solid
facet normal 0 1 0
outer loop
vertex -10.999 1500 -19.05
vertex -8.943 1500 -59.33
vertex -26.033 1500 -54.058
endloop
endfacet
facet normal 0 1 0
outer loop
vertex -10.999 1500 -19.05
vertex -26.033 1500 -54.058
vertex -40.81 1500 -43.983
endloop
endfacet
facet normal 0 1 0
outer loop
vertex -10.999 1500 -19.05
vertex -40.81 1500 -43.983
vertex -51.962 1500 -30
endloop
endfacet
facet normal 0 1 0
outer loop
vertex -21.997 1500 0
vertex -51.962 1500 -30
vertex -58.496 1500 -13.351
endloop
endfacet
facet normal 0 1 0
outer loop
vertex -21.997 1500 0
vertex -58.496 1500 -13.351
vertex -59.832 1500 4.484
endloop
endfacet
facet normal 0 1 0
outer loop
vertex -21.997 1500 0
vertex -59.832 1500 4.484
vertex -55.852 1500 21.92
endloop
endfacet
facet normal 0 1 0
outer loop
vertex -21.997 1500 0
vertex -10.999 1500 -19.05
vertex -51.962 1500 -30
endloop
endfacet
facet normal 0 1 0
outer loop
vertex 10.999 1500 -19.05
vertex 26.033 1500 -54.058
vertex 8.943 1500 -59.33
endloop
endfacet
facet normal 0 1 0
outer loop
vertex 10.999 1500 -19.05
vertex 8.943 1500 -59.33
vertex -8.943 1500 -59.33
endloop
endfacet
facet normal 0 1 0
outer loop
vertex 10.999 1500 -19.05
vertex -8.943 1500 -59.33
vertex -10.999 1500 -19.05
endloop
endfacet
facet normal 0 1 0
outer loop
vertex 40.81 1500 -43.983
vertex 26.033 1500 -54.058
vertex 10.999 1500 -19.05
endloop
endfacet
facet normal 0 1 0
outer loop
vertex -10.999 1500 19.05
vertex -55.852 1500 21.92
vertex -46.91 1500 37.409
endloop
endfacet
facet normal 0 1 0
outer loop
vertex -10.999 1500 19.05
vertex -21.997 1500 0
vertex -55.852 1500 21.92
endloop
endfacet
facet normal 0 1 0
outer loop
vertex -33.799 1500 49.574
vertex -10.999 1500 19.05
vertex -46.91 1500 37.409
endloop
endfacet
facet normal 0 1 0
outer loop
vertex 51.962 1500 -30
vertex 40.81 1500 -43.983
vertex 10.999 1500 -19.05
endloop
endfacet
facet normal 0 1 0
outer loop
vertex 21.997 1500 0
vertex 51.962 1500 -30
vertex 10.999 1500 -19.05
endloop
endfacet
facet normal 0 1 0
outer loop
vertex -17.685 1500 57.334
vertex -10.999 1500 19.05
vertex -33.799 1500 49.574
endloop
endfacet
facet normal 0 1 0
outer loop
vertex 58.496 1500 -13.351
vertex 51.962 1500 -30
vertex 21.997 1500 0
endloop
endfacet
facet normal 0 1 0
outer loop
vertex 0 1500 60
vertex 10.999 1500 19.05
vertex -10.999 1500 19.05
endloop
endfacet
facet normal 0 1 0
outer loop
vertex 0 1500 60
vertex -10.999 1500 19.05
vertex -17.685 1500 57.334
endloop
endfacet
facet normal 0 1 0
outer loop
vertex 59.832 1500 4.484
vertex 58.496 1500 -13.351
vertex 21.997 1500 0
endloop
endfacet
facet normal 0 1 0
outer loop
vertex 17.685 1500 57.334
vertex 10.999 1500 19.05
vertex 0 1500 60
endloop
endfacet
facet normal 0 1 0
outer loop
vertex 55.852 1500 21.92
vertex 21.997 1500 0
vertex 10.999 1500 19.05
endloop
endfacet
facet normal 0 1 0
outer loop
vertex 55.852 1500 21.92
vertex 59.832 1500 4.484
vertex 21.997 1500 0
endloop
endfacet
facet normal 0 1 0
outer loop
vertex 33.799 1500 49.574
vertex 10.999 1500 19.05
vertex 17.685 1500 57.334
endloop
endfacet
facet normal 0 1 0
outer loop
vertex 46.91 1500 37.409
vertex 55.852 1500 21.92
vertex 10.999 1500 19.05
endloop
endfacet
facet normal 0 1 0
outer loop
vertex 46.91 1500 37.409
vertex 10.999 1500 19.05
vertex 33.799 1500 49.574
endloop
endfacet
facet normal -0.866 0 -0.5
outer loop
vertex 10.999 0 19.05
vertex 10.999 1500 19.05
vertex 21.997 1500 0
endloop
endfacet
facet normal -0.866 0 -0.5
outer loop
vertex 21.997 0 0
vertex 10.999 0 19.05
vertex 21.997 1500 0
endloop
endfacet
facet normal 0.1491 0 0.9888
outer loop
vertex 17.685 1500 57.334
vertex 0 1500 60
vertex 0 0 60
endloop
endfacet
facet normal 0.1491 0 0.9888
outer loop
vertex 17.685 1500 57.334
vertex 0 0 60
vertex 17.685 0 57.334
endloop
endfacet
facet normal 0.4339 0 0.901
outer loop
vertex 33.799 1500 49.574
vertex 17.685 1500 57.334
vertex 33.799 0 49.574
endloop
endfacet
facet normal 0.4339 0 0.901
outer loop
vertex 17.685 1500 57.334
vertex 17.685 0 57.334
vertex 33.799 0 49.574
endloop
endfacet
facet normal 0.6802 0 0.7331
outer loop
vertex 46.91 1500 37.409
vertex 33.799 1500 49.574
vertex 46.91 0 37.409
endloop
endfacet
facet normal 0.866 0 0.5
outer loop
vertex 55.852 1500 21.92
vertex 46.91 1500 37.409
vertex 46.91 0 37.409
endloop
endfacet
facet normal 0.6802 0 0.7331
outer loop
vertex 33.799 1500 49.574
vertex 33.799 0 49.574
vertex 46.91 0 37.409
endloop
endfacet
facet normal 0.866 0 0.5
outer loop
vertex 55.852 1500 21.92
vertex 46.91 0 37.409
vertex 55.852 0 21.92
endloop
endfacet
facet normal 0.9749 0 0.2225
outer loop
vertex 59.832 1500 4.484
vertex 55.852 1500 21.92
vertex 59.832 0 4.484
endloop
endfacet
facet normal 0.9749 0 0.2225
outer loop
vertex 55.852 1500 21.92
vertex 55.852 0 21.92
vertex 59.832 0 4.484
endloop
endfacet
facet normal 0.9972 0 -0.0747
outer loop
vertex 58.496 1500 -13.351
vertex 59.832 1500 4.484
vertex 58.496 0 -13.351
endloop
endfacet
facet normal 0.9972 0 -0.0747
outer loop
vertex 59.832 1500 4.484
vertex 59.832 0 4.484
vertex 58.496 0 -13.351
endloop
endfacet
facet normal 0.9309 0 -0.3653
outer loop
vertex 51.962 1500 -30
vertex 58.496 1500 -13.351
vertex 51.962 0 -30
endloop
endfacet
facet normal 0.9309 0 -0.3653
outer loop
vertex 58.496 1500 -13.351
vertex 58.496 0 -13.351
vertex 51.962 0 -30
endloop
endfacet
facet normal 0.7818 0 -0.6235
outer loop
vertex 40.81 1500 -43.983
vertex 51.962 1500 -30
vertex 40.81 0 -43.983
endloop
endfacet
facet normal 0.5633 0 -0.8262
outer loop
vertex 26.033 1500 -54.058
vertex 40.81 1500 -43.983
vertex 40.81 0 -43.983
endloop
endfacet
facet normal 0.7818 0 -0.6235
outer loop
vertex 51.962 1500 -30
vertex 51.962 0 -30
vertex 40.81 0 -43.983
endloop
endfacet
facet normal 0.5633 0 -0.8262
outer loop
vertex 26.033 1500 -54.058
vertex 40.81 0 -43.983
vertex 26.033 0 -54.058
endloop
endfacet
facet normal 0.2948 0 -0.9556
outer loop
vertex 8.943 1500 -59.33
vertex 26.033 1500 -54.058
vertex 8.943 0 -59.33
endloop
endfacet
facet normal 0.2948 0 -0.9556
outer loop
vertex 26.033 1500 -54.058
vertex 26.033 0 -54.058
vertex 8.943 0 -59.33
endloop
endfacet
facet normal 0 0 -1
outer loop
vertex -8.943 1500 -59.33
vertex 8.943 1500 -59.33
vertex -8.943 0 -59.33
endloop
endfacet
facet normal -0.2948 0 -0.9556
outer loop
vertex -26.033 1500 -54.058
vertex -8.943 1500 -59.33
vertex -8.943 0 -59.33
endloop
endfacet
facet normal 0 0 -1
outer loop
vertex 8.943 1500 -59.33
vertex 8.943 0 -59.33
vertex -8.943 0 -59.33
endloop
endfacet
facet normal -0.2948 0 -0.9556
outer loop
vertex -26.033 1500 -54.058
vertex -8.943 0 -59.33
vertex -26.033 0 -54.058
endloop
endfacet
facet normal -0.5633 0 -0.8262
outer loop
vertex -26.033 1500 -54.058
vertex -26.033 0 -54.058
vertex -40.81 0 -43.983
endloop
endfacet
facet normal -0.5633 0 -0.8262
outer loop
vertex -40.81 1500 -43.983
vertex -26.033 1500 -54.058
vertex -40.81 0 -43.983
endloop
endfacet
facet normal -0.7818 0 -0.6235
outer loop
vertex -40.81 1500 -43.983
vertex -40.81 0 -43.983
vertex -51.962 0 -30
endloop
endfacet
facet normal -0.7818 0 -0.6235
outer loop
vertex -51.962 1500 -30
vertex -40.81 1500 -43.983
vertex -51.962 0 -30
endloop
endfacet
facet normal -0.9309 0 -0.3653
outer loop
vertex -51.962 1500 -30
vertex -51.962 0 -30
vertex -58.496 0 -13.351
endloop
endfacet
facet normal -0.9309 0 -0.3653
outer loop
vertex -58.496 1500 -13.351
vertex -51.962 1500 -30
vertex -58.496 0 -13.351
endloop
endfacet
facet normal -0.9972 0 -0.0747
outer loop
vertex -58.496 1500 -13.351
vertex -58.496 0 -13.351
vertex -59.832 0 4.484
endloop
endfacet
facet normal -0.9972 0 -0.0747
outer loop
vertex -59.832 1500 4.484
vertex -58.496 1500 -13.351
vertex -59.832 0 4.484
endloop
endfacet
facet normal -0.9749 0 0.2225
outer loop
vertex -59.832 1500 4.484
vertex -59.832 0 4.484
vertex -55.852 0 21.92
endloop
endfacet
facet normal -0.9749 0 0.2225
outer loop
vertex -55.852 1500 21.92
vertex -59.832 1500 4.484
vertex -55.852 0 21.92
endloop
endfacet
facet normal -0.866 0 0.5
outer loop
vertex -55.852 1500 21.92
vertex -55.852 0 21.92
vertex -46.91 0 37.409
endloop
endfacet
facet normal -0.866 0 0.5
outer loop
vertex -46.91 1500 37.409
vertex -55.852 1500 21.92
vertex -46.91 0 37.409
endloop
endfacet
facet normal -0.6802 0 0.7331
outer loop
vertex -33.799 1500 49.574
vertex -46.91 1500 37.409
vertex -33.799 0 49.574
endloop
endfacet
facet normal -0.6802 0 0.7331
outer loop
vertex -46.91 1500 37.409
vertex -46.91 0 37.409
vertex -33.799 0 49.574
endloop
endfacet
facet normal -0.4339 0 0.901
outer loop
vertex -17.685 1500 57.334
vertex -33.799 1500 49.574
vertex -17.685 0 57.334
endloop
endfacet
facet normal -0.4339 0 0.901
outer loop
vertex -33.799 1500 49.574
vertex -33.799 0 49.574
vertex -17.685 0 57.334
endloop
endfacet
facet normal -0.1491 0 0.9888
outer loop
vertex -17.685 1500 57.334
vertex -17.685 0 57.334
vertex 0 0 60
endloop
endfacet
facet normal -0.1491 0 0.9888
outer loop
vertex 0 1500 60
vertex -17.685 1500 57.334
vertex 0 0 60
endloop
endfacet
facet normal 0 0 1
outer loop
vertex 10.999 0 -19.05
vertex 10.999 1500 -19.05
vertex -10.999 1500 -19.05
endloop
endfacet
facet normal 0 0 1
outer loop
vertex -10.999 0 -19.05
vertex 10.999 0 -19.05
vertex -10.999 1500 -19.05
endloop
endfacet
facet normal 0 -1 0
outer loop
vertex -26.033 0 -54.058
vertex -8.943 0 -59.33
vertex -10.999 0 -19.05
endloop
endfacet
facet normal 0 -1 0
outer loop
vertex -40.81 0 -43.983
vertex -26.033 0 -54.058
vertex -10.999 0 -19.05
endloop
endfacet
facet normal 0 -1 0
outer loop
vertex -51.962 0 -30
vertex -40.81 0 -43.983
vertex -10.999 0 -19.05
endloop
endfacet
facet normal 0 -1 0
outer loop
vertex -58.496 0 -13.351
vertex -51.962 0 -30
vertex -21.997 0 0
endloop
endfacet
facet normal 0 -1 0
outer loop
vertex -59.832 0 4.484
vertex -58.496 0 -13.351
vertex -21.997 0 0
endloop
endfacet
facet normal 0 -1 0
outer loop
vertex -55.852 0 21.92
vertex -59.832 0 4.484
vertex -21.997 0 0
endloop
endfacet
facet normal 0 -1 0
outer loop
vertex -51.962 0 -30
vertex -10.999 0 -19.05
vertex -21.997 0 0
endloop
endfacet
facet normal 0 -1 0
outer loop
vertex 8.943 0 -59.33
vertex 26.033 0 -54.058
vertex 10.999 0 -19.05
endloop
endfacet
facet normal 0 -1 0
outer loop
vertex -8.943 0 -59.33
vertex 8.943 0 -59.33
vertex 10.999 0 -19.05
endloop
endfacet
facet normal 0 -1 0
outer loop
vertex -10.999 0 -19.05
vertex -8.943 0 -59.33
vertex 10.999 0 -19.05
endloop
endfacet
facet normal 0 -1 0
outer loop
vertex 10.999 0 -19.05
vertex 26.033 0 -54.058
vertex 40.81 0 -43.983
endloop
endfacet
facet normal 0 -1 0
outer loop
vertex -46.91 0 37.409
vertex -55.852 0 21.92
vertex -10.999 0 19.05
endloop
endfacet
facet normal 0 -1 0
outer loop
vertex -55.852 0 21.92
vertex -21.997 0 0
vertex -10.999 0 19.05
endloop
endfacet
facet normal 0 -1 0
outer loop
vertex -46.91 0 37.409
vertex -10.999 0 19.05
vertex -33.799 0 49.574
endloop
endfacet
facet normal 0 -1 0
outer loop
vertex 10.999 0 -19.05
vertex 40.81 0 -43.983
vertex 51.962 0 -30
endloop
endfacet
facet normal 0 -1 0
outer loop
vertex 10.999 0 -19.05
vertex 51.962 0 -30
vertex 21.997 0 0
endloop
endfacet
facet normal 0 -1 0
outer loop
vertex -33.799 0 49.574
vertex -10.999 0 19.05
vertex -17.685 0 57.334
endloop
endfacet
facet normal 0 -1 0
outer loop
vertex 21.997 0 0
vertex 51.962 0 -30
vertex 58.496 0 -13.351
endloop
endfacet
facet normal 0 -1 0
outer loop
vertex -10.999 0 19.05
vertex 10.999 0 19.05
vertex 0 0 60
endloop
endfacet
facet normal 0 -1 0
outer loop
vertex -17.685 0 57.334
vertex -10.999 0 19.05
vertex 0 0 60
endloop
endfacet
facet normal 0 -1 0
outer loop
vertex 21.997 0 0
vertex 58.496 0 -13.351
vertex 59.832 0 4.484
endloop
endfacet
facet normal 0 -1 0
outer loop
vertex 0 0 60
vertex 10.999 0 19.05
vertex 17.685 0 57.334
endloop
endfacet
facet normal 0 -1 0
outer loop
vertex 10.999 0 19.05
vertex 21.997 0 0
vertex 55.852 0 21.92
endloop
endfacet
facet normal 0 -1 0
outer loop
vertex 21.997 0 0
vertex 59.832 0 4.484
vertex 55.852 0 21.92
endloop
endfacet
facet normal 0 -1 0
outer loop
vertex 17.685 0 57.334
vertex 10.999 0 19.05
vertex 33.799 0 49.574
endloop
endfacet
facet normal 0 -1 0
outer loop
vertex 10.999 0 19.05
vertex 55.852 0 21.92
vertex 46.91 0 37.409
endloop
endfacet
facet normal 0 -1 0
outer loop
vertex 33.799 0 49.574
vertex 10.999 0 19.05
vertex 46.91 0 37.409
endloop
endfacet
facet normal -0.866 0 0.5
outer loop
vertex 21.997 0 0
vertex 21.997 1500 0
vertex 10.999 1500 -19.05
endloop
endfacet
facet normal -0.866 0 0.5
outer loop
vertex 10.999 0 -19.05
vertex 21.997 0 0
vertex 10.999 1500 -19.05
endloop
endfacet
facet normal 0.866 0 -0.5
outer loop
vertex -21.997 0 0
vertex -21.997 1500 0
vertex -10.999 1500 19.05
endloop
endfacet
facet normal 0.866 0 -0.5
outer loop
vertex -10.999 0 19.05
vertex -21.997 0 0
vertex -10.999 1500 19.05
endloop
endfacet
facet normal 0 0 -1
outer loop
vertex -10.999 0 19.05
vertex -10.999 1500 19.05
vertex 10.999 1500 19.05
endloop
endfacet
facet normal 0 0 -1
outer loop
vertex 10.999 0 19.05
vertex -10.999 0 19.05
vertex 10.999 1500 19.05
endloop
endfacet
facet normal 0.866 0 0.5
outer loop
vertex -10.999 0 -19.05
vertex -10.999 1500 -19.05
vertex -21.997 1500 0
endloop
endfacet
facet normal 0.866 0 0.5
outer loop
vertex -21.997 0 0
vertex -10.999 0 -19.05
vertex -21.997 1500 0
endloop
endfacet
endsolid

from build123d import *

# Parameters (mm, degrees)
SKETCH1_R           = 60
BOSS_EXTRUDE1_DEPTH = 1500
CUT_EXTRUDE1_REACH  = 1504.398


with BuildPart() as part:
    # Sketch1 → Boss-Extrude1 (new body)
    with BuildSketch(Plane(origin=(0, 0, 0), x_dir=(1, 0, 0), z_dir=(0, 1, 0))):
        with Locations(Location((0, 0, 0), (0, 0, 270))):
            Circle(SKETCH1_R)
    extrude(amount=BOSS_EXTRUDE1_DEPTH)

    # Sketch2 → Cut-Extrude1 (cut, up to next)
    with BuildSketch(Plane(origin=(0, 1500, 0), x_dir=(1, 0, 0), z_dir=(0, 1, 0)), mode=Mode.PRIVATE) as cut_extrude1_sk1:
        Polygon((-10.998522628, 19.05), (-21.997045256, 0), (-10.998522628, -19.05), (10.998522628, -19.05), (21.997045256, 0), (10.998522628, 19.05), align=None)
    cut_extrude1_tool1 = extrude(cut_extrude1_sk1.sketch, amount=-CUT_EXTRUDE1_REACH, mode=Mode.PRIVATE) & part.part
    add(cut_extrude1_tool1.solids().sort_by_distance((0, 1500, 0))[0], mode=Mode.SUBTRACT)


solid = part.part
